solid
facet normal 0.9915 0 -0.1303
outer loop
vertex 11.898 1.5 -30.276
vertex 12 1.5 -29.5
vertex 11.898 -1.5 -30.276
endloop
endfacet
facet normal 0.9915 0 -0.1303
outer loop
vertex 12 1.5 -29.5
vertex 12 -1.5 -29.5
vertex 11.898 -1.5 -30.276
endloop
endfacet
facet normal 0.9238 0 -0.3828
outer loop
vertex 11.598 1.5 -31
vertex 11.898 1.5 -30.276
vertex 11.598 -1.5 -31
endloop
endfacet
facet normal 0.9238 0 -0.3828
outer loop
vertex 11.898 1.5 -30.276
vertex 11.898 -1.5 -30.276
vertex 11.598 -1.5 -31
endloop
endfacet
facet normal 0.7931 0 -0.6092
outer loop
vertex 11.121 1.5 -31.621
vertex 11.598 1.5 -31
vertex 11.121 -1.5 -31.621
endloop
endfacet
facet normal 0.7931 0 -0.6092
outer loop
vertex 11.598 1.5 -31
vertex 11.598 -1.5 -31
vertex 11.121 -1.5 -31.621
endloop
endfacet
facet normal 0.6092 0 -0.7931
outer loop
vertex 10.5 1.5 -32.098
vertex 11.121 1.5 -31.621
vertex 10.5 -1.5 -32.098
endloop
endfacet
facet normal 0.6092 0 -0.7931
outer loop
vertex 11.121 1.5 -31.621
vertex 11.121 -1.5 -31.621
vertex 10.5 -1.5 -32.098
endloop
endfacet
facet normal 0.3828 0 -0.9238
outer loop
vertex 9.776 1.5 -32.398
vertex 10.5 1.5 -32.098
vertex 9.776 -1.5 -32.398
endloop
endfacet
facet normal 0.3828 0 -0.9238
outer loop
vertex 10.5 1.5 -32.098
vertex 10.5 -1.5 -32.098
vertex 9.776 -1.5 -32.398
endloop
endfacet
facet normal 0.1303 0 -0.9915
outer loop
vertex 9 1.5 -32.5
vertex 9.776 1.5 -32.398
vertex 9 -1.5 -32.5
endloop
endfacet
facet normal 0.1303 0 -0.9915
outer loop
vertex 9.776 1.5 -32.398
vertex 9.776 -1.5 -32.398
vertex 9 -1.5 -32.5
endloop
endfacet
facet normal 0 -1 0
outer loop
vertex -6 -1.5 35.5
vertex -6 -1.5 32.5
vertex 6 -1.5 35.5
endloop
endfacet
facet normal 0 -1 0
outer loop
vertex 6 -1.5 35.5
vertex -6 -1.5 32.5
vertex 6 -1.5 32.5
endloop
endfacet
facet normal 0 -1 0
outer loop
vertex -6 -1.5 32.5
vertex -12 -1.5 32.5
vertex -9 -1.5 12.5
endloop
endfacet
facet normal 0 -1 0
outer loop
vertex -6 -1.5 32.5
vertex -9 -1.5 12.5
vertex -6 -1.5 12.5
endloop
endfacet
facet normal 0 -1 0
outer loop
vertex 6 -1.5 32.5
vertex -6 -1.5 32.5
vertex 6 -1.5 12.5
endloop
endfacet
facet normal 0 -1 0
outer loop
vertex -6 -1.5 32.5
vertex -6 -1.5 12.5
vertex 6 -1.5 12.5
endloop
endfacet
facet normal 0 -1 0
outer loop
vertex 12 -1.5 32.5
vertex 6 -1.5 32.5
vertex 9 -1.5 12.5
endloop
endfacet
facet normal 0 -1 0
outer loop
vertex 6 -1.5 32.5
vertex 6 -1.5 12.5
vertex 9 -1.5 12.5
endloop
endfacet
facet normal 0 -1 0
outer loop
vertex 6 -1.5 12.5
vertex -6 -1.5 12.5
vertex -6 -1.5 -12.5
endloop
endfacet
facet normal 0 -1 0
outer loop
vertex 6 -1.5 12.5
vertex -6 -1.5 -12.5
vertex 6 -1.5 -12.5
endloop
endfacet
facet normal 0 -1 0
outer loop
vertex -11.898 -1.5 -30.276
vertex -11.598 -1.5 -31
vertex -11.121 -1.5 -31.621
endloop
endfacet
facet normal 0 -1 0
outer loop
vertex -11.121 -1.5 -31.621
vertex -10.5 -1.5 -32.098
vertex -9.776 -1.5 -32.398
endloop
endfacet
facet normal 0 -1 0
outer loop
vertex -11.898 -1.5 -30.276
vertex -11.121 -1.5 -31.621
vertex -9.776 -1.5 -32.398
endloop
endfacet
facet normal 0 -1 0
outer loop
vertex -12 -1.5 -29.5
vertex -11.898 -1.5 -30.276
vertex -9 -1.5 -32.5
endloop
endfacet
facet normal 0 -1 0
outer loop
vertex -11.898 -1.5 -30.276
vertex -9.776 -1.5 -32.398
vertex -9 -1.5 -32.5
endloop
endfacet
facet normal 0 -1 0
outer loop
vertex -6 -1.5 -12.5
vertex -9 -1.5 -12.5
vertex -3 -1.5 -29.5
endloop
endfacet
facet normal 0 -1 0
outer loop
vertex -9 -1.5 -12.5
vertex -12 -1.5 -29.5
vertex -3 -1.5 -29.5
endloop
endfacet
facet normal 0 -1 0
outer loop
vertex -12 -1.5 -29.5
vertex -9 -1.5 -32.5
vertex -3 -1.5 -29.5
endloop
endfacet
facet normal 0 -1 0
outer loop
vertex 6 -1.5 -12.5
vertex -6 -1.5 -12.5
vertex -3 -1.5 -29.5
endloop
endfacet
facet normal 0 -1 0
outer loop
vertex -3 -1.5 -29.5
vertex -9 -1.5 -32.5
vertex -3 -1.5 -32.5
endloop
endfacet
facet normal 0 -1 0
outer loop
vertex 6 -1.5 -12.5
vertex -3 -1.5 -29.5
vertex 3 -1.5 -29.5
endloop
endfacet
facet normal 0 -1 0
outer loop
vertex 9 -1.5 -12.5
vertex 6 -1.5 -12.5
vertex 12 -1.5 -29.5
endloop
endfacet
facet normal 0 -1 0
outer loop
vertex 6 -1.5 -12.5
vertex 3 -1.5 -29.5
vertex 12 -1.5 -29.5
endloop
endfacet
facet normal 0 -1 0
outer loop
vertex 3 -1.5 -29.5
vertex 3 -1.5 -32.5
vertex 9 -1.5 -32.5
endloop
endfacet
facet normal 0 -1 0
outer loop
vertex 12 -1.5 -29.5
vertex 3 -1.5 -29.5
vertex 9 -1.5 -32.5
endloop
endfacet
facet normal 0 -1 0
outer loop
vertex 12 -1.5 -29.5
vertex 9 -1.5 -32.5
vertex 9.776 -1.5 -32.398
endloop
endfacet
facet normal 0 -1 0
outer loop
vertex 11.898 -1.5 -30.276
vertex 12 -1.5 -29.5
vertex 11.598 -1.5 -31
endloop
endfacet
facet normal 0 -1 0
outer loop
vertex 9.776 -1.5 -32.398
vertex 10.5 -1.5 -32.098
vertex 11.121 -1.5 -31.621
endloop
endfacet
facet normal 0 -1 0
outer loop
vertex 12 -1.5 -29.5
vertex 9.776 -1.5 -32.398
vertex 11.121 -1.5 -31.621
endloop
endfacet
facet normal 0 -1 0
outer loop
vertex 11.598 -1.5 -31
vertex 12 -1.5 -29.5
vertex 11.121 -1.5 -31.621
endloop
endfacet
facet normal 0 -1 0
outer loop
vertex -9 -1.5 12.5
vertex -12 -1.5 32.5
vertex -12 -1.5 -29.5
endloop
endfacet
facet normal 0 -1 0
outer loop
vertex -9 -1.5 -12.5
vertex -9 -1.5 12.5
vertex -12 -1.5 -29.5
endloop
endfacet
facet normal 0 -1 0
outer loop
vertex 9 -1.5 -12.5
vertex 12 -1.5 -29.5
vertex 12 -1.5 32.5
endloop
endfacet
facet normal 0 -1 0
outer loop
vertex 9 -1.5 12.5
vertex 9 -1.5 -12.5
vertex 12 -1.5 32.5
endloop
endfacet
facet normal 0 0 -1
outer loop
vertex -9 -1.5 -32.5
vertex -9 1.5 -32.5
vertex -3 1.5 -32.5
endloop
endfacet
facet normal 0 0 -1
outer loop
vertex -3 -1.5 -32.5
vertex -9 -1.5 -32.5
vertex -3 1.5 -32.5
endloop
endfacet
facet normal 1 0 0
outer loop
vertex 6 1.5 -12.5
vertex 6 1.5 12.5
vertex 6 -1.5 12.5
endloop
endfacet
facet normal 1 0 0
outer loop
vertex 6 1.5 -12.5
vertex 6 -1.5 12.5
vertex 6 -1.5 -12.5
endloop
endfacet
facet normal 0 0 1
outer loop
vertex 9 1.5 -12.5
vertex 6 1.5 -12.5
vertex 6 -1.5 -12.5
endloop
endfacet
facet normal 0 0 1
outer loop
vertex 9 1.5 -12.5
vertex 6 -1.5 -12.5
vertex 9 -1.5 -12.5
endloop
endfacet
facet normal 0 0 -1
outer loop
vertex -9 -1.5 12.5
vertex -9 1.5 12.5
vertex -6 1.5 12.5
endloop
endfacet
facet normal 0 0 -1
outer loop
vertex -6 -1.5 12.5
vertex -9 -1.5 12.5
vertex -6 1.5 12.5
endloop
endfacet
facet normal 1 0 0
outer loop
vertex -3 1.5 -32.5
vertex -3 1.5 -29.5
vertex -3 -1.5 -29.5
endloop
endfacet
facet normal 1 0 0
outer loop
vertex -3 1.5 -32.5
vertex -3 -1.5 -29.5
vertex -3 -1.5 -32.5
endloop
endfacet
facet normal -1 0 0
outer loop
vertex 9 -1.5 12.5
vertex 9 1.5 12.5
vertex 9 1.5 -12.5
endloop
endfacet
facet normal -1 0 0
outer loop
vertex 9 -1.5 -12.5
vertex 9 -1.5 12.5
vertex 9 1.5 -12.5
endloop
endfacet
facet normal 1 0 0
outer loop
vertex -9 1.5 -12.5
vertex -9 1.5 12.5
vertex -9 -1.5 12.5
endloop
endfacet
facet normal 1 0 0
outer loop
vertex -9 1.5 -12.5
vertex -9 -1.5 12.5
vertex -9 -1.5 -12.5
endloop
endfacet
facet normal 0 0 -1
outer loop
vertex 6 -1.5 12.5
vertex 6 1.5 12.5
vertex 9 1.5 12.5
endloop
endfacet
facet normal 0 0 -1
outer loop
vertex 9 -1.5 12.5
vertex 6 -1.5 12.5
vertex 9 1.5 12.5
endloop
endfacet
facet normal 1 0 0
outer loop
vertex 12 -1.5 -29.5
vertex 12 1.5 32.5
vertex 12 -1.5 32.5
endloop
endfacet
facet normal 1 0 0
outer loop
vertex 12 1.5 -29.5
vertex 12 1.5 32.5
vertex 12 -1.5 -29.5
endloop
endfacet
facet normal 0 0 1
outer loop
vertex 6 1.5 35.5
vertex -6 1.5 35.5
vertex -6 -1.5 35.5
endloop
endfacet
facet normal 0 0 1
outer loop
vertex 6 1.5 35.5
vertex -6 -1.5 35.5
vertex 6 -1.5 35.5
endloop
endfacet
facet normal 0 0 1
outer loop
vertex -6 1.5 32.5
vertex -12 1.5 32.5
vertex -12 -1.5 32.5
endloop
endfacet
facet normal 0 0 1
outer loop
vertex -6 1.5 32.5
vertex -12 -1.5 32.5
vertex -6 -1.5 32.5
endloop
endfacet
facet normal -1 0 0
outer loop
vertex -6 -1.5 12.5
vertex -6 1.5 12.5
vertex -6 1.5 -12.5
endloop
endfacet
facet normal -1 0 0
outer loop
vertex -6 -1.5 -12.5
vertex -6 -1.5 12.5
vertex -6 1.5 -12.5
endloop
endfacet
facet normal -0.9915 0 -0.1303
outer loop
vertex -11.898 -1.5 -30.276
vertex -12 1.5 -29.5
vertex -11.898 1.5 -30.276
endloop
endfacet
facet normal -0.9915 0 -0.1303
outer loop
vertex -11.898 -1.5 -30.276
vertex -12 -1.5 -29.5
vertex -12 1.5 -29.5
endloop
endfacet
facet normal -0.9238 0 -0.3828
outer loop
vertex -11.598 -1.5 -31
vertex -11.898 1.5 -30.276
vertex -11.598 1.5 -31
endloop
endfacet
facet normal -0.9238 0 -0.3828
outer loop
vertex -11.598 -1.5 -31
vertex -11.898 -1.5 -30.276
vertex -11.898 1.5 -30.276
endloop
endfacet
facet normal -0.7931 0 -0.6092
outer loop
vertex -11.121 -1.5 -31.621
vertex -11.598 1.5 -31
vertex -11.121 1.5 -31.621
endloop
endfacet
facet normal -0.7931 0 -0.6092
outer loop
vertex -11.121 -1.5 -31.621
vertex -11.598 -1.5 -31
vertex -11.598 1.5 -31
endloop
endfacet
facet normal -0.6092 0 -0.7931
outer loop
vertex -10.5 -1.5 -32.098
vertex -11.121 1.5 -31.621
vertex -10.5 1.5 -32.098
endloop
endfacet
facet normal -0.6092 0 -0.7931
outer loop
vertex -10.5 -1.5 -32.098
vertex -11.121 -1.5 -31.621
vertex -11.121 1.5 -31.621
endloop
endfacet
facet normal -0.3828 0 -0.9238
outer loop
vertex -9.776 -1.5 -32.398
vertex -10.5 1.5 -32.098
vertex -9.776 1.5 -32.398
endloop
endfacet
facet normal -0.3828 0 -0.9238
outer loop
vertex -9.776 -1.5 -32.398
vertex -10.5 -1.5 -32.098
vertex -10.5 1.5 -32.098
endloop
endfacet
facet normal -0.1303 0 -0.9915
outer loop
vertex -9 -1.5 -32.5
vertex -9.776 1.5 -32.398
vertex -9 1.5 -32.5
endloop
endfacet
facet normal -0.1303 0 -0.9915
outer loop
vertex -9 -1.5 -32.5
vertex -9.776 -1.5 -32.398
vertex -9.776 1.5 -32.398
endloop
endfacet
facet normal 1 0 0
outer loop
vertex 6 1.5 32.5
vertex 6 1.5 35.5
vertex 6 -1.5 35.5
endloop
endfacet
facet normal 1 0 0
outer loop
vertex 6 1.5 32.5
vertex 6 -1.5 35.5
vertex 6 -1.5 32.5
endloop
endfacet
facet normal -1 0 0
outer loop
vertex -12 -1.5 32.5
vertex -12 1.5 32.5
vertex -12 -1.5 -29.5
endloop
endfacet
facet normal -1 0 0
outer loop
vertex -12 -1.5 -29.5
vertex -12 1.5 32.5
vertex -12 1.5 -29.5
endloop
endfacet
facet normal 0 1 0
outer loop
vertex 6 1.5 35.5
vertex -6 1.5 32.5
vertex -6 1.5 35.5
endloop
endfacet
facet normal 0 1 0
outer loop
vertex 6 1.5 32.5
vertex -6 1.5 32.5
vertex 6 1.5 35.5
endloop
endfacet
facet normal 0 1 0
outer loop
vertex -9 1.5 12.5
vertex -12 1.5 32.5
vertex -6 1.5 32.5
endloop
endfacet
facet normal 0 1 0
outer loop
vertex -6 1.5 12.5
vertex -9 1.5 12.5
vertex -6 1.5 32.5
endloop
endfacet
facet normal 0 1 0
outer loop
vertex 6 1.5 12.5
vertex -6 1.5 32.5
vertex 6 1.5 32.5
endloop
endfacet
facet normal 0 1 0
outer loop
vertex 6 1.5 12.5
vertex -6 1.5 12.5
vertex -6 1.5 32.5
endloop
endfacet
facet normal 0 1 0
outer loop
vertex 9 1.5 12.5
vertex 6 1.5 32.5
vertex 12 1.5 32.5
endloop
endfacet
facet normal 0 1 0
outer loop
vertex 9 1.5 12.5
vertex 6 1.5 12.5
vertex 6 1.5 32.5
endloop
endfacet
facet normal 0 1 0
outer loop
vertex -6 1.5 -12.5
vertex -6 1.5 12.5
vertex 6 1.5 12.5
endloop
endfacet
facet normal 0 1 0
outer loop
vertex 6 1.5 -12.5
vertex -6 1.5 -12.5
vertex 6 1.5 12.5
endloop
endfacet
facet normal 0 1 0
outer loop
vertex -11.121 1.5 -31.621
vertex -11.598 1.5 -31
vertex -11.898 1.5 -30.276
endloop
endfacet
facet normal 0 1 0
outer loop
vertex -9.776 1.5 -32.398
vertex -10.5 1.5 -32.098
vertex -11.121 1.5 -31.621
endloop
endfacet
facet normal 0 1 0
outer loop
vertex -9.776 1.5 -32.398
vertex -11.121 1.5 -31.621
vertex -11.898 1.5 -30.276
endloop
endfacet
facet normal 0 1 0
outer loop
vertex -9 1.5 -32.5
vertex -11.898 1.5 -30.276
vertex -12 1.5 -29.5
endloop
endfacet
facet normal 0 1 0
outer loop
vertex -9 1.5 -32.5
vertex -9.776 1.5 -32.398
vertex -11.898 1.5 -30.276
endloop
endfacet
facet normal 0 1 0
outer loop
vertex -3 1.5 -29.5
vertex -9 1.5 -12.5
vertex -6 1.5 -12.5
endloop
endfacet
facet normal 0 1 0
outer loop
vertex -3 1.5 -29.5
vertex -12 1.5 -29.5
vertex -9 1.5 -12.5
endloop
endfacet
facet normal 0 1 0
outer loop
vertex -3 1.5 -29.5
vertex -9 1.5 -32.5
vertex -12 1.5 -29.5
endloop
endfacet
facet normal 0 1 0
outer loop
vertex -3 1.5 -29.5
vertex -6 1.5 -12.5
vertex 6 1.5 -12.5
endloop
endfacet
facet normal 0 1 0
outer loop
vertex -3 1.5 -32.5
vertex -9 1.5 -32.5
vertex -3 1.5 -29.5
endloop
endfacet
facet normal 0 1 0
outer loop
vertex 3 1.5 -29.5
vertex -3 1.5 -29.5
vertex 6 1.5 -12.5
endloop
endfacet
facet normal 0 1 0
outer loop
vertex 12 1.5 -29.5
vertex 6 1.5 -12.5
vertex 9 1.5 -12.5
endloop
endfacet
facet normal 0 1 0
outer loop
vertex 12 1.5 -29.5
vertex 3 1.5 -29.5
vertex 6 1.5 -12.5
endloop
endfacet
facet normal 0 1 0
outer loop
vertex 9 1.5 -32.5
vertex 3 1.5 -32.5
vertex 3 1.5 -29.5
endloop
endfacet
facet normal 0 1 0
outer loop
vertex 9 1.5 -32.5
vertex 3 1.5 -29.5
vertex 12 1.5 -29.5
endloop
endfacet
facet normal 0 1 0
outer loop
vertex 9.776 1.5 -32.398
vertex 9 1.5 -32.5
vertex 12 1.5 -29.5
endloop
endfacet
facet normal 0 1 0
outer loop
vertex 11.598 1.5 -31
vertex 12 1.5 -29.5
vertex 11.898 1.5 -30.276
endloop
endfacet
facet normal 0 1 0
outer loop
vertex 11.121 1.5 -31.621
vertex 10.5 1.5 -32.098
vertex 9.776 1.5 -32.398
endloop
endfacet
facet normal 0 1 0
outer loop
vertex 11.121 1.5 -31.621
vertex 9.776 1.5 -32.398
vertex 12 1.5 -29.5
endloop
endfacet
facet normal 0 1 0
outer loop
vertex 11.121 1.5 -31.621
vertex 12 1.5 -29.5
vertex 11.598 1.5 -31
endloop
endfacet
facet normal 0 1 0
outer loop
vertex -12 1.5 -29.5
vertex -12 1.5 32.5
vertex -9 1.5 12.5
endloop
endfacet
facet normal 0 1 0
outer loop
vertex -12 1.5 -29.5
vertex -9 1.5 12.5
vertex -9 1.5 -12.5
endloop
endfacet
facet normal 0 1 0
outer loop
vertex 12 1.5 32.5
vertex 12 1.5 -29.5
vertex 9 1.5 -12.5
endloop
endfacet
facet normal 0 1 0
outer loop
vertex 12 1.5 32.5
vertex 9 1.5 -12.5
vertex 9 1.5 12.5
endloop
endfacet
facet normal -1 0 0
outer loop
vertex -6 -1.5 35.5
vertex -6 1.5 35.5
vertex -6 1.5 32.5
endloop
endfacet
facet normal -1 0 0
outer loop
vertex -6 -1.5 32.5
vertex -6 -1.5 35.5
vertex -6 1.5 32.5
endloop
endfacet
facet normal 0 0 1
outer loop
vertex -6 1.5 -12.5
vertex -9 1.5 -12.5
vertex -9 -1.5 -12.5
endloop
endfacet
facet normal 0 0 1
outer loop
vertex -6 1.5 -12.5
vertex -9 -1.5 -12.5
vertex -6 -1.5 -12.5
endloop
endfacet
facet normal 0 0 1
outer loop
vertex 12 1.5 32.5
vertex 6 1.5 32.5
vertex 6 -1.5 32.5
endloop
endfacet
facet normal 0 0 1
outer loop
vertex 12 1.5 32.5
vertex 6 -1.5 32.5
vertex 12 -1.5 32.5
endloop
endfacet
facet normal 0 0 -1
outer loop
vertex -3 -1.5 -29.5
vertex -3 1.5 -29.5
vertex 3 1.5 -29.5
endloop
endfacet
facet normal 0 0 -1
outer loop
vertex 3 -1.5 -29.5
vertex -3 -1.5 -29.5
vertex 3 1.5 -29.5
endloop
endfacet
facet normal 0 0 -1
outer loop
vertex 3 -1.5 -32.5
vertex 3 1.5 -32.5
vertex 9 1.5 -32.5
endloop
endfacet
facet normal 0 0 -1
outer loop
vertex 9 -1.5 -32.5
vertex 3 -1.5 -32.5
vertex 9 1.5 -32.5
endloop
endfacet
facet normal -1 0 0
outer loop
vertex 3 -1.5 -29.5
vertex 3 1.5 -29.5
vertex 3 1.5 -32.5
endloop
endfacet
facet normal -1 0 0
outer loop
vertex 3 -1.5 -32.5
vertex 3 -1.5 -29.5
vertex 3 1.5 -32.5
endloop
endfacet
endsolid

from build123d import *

# Parameters (mm, degrees)
SKETCH1_W               = 24
SKETCH1_H               = 65
BOSS_EXTRUDE1_DEPTH     = 1.5
SKETCH2_W               = 12
SKETCH2_H               = 3
BOSS_EXTRUDE2_DEPTH     = 1.5
SKETCH4_W               = 3
SKETCH4_H               = 25
CUT_EXTRUDE1_DEPTH      = 2.5
CUT_EXTRUDE1_DEPTH_BACK = 2.5
FILLET1_R               = 3
SKETCH5_W               = 6
SKETCH5_H               = 3
CUT_EXTRUDE2_DEPTH      = 2.5
CUT_EXTRUDE2_DEPTH_BACK = 2.5


with BuildPart() as part:
    # Sketch1 → Boss-Extrude1 (new body, symmetric)
    with BuildSketch(Plane(origin=(0, 0, 0), x_dir=(1, 0, 0), z_dir=(0, 1, 0))):
        Rectangle(SKETCH1_W, SKETCH1_H)
    extrude(amount=BOSS_EXTRUDE1_DEPTH, both=True)

    # Sketch2 → Boss-Extrude2 (add, symmetric)
    with BuildSketch(Plane(origin=(0, 0, 0), x_dir=(1, 0, 0), z_dir=(0, 1, 0))):
        with Locations((0, -34)):
            Rectangle(SKETCH2_W, SKETCH2_H)
    extrude(amount=BOSS_EXTRUDE2_DEPTH, both=True)

    # Sketch4 → Cut-Extrude1 (cut, two sides)
    with BuildSketch(Plane(origin=(0, 0, 0), x_dir=(1, 0, 0), z_dir=(0, 1, 0))) as cut_extrude1_sk:
        with Locations((-7.5, 0)):
            Rectangle(SKETCH4_W, SKETCH4_H)
        with Locations((7.5, 0)):
            Rectangle(SKETCH4_W, SKETCH4_H)
    extrude(amount=CUT_EXTRUDE1_DEPTH, mode=Mode.SUBTRACT)
    extrude(cut_extrude1_sk.sketch, amount=-CUT_EXTRUDE1_DEPTH_BACK, mode=Mode.SUBTRACT)

    # Fillet1
    fillet1_edges = [part.edges().sort_by_distance(p)[0] for p in [
        (-12, 0, -32.5),
        (12, 0, -32.5),
    ]]
    fillet(fillet1_edges, radius=FILLET1_R)

    # Sketch5 → Cut-Extrude2 (cut, two sides)
    with BuildSketch(Plane(origin=(0, 0, 0), x_dir=(1, 0, 0), z_dir=(0, 1, 0))) as cut_extrude2_sk:
        with Locations((0, 31)):
            Rectangle(SKETCH5_W, SKETCH5_H)
    extrude(amount=CUT_EXTRUDE2_DEPTH, mode=Mode.SUBTRACT)
    extrude(cut_extrude2_sk.sketch, amount=-CUT_EXTRUDE2_DEPTH_BACK, mode=Mode.SUBTRACT)


solid = part.part
